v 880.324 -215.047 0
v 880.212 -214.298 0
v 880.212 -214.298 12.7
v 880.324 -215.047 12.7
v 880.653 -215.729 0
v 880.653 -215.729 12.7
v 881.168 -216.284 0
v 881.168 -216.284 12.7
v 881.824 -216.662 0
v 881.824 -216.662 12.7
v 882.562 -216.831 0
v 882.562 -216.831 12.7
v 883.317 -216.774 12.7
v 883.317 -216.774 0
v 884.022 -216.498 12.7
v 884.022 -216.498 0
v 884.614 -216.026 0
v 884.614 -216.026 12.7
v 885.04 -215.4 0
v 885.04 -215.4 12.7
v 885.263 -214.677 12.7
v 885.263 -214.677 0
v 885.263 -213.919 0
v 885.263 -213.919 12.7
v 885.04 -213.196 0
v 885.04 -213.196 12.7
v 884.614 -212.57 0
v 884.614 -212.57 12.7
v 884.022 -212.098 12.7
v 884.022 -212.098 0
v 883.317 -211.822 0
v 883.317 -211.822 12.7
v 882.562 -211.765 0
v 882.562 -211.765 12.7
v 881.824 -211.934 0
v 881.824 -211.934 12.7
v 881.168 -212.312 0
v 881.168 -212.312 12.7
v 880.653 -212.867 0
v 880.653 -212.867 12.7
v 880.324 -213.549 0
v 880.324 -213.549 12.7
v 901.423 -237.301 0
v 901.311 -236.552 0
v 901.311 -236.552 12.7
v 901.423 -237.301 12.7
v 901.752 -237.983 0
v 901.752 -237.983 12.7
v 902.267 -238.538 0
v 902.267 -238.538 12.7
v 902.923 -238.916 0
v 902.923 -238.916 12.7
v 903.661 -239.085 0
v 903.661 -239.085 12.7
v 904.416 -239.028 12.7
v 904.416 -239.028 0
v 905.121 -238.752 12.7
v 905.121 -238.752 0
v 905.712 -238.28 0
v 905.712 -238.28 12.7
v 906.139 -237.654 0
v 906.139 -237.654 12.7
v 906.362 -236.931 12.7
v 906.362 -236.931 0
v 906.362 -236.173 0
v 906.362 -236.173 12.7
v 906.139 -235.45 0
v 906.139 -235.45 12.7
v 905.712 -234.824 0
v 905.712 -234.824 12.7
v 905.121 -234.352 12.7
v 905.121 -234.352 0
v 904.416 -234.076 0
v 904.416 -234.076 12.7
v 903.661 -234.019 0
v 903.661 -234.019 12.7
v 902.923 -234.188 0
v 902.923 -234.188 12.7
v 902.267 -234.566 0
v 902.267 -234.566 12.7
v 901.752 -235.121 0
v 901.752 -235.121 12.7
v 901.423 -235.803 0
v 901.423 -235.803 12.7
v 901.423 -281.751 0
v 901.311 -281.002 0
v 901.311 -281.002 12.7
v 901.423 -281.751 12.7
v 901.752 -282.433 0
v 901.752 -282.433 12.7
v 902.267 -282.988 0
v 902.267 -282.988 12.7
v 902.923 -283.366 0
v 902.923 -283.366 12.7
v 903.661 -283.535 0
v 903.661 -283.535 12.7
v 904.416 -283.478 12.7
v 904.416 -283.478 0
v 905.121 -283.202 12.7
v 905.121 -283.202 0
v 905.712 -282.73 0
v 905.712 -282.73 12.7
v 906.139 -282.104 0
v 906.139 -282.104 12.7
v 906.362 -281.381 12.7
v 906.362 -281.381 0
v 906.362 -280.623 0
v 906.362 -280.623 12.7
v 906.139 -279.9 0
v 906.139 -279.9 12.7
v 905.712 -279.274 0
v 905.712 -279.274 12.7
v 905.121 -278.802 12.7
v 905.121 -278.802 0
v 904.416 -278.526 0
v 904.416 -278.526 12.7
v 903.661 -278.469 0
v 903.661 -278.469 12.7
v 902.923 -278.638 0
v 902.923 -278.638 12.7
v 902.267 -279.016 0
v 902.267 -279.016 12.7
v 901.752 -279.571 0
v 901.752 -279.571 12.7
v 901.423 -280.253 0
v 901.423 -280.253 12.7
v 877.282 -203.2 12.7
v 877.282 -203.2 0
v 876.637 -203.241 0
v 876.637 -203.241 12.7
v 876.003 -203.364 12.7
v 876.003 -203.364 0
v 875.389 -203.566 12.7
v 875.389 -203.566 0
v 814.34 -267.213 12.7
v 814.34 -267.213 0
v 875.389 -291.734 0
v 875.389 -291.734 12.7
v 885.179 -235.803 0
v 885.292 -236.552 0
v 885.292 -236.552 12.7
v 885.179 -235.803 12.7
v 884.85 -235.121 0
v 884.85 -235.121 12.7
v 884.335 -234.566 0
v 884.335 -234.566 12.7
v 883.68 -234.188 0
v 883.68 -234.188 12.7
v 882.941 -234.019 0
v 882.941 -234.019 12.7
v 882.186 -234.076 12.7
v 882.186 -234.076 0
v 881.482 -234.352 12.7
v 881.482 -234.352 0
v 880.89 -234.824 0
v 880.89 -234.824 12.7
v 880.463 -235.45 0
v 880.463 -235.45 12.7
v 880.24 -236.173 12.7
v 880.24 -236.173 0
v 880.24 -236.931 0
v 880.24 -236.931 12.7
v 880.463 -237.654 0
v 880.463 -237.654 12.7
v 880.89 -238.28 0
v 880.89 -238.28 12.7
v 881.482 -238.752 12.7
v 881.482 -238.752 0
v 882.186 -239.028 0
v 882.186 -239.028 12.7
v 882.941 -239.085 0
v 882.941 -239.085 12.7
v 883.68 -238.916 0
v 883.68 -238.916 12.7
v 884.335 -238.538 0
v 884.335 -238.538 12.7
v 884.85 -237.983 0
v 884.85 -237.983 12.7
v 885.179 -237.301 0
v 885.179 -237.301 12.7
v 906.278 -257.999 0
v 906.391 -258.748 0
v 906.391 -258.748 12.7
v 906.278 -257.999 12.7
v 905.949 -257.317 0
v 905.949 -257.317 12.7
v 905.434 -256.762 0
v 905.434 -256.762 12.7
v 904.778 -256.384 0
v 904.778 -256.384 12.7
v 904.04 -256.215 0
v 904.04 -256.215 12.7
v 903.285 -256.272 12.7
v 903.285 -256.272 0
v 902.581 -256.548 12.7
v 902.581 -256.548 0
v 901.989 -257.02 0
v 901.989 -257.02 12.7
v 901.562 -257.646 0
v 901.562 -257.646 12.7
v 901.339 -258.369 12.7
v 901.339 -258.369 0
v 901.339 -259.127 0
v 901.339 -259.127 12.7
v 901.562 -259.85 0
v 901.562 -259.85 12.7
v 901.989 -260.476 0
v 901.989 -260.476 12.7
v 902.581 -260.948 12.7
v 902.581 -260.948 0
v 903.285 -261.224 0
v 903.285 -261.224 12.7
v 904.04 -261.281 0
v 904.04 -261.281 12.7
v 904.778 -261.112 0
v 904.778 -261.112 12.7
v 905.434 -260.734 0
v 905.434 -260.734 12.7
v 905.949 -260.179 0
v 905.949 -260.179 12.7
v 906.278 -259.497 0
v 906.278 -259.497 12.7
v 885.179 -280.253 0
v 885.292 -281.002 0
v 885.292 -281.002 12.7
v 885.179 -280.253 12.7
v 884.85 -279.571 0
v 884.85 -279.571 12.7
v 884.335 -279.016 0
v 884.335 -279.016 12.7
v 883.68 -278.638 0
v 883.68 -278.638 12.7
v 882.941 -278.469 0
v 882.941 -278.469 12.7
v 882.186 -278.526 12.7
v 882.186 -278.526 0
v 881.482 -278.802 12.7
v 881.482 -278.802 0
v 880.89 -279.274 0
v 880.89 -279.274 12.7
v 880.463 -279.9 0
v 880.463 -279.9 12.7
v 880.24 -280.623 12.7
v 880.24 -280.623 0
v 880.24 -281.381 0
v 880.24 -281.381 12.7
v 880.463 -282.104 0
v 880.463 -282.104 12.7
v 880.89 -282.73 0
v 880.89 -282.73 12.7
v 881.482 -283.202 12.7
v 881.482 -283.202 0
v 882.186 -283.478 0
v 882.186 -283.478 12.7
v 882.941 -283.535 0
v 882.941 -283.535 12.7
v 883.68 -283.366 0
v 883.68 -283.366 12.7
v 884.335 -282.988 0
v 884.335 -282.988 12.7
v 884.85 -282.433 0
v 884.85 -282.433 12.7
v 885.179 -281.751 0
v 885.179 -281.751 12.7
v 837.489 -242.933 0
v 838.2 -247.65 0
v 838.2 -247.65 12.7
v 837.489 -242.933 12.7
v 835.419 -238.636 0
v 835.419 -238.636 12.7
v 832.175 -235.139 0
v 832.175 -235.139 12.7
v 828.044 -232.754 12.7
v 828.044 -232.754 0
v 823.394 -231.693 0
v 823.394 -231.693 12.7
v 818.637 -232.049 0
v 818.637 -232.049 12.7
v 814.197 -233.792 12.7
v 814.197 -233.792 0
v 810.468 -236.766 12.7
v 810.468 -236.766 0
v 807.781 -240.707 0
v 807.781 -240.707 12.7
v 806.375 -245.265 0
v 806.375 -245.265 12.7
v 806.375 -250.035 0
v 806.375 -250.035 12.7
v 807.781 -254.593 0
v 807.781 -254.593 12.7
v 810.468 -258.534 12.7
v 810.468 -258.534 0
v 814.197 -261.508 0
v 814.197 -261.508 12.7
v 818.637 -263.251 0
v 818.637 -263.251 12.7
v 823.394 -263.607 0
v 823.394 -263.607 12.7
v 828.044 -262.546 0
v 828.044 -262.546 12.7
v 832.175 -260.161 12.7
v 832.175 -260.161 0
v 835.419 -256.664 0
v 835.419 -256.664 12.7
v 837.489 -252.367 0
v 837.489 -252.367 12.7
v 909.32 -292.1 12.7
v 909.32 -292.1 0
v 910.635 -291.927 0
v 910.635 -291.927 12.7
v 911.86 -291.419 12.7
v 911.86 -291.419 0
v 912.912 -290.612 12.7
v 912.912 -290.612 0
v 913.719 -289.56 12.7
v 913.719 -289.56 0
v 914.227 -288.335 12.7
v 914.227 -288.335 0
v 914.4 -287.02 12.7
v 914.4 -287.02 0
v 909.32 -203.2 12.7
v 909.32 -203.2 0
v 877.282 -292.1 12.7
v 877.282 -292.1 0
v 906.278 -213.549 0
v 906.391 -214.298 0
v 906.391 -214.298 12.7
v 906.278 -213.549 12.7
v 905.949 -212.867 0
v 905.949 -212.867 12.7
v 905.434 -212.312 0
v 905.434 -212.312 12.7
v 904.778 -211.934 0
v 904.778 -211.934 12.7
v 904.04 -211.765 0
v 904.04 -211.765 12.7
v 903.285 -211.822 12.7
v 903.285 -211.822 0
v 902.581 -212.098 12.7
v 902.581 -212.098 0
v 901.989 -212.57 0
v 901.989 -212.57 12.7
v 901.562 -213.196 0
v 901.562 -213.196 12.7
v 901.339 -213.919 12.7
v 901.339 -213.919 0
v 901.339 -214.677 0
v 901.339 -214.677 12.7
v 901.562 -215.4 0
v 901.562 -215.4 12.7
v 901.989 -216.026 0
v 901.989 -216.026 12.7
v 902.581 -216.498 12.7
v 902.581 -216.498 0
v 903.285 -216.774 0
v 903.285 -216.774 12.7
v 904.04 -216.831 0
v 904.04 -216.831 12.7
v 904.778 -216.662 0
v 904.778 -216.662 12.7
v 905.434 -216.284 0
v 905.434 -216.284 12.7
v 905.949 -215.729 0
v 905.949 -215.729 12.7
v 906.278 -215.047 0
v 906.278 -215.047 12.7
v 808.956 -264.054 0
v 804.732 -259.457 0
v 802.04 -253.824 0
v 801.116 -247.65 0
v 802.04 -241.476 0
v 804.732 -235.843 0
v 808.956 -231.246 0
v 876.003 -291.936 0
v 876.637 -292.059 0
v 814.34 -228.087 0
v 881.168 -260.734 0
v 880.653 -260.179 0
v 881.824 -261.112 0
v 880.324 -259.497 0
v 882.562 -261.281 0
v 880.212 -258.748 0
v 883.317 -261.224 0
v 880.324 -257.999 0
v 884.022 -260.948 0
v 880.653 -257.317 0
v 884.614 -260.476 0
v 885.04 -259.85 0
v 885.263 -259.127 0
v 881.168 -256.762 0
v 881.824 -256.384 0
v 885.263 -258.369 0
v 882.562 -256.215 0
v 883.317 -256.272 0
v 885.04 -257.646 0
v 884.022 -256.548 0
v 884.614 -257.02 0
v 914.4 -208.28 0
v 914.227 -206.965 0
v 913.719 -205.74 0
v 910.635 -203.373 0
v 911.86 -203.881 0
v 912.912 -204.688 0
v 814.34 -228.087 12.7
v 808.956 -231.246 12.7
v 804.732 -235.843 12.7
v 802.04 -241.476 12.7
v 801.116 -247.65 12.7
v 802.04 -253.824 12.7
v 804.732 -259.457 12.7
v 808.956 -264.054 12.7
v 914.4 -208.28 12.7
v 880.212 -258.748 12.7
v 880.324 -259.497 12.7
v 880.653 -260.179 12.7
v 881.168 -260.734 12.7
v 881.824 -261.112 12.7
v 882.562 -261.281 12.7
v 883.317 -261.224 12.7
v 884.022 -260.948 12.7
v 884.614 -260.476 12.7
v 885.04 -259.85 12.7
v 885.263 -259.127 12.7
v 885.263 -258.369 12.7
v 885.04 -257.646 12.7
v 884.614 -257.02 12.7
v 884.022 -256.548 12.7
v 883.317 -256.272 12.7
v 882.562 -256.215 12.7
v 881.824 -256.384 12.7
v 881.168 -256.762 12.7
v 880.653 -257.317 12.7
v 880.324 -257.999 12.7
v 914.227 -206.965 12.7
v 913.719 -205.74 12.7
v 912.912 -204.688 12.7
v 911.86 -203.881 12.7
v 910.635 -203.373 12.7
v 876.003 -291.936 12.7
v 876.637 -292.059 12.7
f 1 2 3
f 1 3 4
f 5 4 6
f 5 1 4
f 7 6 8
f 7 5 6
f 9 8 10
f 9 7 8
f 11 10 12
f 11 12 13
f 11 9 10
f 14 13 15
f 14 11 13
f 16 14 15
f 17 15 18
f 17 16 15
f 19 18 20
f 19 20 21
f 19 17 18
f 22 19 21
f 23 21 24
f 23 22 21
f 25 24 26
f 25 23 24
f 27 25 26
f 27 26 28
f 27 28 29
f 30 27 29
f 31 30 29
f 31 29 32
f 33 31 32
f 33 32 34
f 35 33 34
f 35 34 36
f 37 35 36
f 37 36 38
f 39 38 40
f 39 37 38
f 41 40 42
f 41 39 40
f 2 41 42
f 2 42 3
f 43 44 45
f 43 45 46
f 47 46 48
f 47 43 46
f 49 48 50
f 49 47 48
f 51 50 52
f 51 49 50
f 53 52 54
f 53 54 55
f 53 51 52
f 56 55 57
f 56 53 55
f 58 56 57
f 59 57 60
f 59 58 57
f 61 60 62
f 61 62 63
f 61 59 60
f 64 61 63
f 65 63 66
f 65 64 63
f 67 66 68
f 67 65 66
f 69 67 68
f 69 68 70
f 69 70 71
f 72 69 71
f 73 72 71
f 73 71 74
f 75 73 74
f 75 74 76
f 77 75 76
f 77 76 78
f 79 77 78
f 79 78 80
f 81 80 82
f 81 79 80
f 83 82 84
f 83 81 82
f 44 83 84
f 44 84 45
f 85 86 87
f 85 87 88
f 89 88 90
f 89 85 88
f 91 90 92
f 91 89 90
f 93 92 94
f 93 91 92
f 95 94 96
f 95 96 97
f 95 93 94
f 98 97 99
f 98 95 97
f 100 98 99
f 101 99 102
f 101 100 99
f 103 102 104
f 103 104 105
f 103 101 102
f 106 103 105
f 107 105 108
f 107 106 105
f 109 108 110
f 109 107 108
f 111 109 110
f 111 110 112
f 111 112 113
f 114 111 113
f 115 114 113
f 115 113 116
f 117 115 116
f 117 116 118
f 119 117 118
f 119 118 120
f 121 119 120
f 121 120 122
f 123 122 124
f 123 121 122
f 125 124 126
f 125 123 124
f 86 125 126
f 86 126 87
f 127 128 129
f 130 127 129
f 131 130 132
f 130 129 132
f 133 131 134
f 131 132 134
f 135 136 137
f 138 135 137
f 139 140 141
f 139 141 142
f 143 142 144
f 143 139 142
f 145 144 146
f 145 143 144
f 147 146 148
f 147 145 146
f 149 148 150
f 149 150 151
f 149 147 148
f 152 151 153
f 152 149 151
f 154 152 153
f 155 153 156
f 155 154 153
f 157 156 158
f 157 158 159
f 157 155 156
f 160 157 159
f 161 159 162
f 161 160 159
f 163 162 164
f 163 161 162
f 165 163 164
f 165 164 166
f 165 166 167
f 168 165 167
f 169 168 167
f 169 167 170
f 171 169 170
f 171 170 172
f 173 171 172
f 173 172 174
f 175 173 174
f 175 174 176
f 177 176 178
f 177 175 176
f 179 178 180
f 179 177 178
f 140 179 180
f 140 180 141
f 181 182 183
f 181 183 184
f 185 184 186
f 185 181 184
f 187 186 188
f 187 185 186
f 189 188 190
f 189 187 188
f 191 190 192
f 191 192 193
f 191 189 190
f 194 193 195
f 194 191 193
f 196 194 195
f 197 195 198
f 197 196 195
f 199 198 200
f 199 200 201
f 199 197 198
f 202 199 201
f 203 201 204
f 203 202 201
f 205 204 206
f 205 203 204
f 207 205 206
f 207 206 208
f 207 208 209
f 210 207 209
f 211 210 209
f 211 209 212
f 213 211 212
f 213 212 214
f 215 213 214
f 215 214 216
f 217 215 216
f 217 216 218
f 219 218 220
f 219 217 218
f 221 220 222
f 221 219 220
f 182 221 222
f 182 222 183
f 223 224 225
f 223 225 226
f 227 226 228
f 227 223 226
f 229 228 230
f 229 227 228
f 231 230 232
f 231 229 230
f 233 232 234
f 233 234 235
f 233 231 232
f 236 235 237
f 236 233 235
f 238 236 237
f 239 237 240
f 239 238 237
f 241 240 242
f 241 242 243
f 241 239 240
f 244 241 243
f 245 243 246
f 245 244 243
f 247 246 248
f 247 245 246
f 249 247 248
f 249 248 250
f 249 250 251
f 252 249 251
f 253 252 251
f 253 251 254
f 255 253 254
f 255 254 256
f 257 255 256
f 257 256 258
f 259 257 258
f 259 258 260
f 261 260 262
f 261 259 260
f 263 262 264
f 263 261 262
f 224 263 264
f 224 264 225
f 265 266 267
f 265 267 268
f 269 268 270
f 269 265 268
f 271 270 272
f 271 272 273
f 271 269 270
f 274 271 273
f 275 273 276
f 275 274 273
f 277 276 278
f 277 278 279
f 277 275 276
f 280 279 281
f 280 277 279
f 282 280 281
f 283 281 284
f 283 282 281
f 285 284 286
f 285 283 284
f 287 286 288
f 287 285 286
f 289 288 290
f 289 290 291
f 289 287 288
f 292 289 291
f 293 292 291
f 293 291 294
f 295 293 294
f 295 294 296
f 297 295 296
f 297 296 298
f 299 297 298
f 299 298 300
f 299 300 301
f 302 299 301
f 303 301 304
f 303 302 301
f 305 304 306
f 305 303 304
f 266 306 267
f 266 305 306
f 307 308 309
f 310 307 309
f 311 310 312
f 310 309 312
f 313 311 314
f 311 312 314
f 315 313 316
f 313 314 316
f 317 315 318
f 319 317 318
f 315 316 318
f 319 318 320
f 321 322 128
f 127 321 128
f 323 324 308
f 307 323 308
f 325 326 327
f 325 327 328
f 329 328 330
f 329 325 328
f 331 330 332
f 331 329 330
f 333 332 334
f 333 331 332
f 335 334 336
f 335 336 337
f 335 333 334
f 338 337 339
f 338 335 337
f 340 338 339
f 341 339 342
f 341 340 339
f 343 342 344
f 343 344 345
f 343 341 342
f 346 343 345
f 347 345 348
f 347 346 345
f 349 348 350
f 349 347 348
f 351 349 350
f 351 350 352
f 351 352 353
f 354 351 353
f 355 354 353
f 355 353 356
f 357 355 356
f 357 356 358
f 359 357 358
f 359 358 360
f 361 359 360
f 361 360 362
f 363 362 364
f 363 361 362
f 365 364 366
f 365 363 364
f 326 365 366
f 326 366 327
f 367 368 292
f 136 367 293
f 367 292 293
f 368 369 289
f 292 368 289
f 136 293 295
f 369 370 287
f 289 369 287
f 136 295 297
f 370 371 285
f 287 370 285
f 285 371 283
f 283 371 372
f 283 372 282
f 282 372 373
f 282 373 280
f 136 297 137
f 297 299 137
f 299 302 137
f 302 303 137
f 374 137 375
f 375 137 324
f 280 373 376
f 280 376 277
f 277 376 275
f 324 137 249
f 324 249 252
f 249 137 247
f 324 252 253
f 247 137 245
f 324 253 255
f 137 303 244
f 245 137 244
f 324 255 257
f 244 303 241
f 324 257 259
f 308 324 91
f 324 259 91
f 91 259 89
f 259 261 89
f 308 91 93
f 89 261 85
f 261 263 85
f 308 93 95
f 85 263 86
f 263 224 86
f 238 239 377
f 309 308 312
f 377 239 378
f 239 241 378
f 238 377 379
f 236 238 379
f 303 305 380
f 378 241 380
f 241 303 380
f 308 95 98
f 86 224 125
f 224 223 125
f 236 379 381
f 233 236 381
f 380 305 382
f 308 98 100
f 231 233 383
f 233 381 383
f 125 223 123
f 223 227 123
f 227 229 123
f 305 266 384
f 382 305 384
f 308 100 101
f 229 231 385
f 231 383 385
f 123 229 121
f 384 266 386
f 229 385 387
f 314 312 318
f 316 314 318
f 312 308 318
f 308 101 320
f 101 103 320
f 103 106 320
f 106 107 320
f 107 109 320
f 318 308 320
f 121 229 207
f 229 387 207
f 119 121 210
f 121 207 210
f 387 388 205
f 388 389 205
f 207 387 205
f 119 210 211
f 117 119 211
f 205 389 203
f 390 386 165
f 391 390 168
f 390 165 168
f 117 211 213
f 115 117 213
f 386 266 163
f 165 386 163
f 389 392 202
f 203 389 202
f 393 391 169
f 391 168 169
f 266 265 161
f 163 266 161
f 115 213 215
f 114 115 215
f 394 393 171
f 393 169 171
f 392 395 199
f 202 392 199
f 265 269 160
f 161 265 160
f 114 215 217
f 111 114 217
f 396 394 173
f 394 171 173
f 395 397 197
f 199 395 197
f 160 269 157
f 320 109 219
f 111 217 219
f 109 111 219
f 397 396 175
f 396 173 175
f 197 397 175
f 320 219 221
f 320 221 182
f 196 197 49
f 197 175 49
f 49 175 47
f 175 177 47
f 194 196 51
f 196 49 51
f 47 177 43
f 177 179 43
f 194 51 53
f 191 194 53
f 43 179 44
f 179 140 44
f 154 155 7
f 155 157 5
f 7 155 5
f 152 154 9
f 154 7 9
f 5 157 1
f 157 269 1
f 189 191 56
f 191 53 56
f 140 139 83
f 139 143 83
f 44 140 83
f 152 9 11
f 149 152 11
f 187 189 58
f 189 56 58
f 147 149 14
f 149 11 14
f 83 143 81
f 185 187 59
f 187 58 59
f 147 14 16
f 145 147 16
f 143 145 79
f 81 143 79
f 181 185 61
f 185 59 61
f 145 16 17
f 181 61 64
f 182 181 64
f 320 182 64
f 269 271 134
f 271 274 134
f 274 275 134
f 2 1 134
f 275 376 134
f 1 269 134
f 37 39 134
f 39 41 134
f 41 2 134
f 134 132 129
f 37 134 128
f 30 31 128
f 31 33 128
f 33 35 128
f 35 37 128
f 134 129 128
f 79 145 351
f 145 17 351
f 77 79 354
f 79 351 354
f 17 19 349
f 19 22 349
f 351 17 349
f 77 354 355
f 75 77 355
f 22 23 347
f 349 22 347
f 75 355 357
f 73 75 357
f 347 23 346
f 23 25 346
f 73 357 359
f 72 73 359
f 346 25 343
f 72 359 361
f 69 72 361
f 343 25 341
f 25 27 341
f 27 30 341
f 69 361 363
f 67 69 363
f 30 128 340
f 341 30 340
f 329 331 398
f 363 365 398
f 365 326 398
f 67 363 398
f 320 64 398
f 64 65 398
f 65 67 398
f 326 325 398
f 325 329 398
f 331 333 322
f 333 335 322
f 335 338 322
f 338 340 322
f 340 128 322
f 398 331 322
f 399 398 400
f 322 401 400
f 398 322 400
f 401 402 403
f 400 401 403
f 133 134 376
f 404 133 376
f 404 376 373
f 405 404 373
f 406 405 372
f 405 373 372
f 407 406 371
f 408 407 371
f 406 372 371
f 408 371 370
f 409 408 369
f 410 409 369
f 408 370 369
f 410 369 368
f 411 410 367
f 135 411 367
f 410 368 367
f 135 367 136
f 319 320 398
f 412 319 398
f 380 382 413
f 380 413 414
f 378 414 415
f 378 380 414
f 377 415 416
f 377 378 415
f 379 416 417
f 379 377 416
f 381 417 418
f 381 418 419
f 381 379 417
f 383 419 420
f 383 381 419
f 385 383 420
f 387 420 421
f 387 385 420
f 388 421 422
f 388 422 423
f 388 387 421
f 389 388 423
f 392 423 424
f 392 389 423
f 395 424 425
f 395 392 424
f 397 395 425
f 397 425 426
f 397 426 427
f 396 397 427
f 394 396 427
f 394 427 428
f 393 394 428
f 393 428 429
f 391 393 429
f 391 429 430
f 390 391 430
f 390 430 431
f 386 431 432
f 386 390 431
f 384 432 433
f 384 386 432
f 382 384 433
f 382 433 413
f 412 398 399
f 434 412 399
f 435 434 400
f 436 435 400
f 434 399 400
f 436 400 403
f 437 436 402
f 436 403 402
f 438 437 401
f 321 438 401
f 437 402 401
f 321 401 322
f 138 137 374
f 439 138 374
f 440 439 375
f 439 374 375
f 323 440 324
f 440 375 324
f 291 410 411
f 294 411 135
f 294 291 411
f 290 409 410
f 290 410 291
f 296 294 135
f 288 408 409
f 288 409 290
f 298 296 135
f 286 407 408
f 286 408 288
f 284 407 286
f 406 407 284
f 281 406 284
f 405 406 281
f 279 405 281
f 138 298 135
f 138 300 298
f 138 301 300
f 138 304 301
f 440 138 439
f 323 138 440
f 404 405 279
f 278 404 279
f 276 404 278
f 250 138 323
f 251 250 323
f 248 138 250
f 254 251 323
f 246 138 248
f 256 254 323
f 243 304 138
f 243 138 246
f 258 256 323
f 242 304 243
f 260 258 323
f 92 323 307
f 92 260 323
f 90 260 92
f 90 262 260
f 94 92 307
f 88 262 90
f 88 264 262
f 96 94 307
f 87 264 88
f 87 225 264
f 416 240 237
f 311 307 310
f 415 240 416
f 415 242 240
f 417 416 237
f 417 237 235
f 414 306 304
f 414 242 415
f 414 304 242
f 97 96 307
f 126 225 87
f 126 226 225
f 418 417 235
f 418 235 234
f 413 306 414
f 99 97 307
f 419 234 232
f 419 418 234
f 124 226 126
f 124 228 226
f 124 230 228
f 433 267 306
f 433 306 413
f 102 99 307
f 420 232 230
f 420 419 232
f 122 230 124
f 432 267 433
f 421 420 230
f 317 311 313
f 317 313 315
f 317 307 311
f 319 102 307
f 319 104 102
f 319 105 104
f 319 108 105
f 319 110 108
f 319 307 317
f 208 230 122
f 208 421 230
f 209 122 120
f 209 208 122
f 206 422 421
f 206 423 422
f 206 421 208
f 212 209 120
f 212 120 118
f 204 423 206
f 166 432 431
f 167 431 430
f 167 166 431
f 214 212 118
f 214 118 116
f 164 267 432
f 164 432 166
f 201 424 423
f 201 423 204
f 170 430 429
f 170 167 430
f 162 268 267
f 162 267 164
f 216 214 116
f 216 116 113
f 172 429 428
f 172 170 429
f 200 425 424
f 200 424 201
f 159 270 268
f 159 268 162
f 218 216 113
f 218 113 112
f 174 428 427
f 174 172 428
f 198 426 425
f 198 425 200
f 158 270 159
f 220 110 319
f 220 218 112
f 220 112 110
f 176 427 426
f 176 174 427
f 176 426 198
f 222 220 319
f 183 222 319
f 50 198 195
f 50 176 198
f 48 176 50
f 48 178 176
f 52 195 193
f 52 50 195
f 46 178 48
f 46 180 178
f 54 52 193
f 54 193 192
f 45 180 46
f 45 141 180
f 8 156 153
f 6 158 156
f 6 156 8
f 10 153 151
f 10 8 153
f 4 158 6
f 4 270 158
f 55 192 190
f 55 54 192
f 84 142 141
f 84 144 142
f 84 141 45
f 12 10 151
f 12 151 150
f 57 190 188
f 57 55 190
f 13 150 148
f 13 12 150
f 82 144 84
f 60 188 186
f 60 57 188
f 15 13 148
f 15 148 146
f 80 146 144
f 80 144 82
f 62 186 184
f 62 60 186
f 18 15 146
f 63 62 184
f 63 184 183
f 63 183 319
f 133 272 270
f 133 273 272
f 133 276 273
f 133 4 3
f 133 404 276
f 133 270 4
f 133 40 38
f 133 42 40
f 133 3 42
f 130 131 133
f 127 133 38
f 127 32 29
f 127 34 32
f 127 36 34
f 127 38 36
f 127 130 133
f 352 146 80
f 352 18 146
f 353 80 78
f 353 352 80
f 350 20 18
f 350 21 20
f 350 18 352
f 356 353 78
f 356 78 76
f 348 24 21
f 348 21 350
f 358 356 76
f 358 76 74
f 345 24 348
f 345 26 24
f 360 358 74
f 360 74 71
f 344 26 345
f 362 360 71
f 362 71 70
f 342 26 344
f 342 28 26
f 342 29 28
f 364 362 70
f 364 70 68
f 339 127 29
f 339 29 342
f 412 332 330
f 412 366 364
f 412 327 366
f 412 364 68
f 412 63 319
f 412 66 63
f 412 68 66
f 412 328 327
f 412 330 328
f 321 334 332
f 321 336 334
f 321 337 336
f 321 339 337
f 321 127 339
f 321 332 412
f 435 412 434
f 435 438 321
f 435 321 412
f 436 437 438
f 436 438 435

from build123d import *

# Parameters (mm, degrees)
SKETCH1_R           = 16.002
SKETCH1_R_2         = 2.54
BOSS_EXTRUDE1_DEPTH = 12.7


with BuildPart() as part:
    # Sketch1 → Boss-Extrude1 (new body)
    with BuildSketch(Plane.XY):
        with BuildLine():
            Line((877.282099838, -292.1), (909.32, -292.1))
            ThreePointArc((909.32, -292.1), (912.912102448, -290.612102448), (914.4, -287.02))
            Line((914.4, -287.02), (914.4, -208.28))
            ThreePointArc((914.4, -208.28), (912.912102448, -204.687897552), (909.32, -203.2))
            Line((909.32, -203.2), (877.282099838, -203.2))
            ThreePointArc((877.282099838, -203.2), (876.317854156, -203.292352231), (875.388667624, -203.566051077))
            Line((875.388667624, -203.566051077), (814.340256312, -228.087111968))
            ThreePointArc((814.340256312, -228.087111968), (801.116, -247.65), (814.340256312, -267.212888032))
            Line((814.340256312, -267.212888032), (875.388667624, -291.733948923))
            ThreePointArc((875.388667624, -291.733948923), (876.317854156, -292.007647769), (877.282099838, -292.1))
        make_face()
        with Locations((822.198, -247.65)):
            Circle(SKETCH1_R, mode=Mode.SUBTRACT)
        with Locations((903.850524959, -214.298026916)):
            Circle(SKETCH1_R_2, mode=Mode.SUBTRACT)
        with Locations(Location((882.751574878, -214.298026916, 0), (0, 0, 180))):
            Circle(SKETCH1_R_2, mode=Mode.SUBTRACT)
        with Locations((882.751574878, -236.551973084)):
            Circle(SKETCH1_R_2, mode=Mode.SUBTRACT)
        with Locations(Location((903.850524959, -236.551973084, 0), (0, 0, 180))):
            Circle(SKETCH1_R_2, mode=Mode.SUBTRACT)
        with Locations(Location((882.751574878, -258.748026916, 0), (0, 0, 180))):
            Circle(SKETCH1_R_2, mode=Mode.SUBTRACT)
        with Locations((882.751574878, -281.001973084)):
            Circle(SKETCH1_R_2, mode=Mode.SUBTRACT)
        with Locations((903.850524959, -258.748026916)):
            Circle(SKETCH1_R_2, mode=Mode.SUBTRACT)
        with Locations(Location((903.850524959, -281.001973084, 0), (0, 0, 180))):
            Circle(SKETCH1_R_2, mode=Mode.SUBTRACT)
    extrude(amount=BOSS_EXTRUDE1_DEPTH)


solid = part.part
